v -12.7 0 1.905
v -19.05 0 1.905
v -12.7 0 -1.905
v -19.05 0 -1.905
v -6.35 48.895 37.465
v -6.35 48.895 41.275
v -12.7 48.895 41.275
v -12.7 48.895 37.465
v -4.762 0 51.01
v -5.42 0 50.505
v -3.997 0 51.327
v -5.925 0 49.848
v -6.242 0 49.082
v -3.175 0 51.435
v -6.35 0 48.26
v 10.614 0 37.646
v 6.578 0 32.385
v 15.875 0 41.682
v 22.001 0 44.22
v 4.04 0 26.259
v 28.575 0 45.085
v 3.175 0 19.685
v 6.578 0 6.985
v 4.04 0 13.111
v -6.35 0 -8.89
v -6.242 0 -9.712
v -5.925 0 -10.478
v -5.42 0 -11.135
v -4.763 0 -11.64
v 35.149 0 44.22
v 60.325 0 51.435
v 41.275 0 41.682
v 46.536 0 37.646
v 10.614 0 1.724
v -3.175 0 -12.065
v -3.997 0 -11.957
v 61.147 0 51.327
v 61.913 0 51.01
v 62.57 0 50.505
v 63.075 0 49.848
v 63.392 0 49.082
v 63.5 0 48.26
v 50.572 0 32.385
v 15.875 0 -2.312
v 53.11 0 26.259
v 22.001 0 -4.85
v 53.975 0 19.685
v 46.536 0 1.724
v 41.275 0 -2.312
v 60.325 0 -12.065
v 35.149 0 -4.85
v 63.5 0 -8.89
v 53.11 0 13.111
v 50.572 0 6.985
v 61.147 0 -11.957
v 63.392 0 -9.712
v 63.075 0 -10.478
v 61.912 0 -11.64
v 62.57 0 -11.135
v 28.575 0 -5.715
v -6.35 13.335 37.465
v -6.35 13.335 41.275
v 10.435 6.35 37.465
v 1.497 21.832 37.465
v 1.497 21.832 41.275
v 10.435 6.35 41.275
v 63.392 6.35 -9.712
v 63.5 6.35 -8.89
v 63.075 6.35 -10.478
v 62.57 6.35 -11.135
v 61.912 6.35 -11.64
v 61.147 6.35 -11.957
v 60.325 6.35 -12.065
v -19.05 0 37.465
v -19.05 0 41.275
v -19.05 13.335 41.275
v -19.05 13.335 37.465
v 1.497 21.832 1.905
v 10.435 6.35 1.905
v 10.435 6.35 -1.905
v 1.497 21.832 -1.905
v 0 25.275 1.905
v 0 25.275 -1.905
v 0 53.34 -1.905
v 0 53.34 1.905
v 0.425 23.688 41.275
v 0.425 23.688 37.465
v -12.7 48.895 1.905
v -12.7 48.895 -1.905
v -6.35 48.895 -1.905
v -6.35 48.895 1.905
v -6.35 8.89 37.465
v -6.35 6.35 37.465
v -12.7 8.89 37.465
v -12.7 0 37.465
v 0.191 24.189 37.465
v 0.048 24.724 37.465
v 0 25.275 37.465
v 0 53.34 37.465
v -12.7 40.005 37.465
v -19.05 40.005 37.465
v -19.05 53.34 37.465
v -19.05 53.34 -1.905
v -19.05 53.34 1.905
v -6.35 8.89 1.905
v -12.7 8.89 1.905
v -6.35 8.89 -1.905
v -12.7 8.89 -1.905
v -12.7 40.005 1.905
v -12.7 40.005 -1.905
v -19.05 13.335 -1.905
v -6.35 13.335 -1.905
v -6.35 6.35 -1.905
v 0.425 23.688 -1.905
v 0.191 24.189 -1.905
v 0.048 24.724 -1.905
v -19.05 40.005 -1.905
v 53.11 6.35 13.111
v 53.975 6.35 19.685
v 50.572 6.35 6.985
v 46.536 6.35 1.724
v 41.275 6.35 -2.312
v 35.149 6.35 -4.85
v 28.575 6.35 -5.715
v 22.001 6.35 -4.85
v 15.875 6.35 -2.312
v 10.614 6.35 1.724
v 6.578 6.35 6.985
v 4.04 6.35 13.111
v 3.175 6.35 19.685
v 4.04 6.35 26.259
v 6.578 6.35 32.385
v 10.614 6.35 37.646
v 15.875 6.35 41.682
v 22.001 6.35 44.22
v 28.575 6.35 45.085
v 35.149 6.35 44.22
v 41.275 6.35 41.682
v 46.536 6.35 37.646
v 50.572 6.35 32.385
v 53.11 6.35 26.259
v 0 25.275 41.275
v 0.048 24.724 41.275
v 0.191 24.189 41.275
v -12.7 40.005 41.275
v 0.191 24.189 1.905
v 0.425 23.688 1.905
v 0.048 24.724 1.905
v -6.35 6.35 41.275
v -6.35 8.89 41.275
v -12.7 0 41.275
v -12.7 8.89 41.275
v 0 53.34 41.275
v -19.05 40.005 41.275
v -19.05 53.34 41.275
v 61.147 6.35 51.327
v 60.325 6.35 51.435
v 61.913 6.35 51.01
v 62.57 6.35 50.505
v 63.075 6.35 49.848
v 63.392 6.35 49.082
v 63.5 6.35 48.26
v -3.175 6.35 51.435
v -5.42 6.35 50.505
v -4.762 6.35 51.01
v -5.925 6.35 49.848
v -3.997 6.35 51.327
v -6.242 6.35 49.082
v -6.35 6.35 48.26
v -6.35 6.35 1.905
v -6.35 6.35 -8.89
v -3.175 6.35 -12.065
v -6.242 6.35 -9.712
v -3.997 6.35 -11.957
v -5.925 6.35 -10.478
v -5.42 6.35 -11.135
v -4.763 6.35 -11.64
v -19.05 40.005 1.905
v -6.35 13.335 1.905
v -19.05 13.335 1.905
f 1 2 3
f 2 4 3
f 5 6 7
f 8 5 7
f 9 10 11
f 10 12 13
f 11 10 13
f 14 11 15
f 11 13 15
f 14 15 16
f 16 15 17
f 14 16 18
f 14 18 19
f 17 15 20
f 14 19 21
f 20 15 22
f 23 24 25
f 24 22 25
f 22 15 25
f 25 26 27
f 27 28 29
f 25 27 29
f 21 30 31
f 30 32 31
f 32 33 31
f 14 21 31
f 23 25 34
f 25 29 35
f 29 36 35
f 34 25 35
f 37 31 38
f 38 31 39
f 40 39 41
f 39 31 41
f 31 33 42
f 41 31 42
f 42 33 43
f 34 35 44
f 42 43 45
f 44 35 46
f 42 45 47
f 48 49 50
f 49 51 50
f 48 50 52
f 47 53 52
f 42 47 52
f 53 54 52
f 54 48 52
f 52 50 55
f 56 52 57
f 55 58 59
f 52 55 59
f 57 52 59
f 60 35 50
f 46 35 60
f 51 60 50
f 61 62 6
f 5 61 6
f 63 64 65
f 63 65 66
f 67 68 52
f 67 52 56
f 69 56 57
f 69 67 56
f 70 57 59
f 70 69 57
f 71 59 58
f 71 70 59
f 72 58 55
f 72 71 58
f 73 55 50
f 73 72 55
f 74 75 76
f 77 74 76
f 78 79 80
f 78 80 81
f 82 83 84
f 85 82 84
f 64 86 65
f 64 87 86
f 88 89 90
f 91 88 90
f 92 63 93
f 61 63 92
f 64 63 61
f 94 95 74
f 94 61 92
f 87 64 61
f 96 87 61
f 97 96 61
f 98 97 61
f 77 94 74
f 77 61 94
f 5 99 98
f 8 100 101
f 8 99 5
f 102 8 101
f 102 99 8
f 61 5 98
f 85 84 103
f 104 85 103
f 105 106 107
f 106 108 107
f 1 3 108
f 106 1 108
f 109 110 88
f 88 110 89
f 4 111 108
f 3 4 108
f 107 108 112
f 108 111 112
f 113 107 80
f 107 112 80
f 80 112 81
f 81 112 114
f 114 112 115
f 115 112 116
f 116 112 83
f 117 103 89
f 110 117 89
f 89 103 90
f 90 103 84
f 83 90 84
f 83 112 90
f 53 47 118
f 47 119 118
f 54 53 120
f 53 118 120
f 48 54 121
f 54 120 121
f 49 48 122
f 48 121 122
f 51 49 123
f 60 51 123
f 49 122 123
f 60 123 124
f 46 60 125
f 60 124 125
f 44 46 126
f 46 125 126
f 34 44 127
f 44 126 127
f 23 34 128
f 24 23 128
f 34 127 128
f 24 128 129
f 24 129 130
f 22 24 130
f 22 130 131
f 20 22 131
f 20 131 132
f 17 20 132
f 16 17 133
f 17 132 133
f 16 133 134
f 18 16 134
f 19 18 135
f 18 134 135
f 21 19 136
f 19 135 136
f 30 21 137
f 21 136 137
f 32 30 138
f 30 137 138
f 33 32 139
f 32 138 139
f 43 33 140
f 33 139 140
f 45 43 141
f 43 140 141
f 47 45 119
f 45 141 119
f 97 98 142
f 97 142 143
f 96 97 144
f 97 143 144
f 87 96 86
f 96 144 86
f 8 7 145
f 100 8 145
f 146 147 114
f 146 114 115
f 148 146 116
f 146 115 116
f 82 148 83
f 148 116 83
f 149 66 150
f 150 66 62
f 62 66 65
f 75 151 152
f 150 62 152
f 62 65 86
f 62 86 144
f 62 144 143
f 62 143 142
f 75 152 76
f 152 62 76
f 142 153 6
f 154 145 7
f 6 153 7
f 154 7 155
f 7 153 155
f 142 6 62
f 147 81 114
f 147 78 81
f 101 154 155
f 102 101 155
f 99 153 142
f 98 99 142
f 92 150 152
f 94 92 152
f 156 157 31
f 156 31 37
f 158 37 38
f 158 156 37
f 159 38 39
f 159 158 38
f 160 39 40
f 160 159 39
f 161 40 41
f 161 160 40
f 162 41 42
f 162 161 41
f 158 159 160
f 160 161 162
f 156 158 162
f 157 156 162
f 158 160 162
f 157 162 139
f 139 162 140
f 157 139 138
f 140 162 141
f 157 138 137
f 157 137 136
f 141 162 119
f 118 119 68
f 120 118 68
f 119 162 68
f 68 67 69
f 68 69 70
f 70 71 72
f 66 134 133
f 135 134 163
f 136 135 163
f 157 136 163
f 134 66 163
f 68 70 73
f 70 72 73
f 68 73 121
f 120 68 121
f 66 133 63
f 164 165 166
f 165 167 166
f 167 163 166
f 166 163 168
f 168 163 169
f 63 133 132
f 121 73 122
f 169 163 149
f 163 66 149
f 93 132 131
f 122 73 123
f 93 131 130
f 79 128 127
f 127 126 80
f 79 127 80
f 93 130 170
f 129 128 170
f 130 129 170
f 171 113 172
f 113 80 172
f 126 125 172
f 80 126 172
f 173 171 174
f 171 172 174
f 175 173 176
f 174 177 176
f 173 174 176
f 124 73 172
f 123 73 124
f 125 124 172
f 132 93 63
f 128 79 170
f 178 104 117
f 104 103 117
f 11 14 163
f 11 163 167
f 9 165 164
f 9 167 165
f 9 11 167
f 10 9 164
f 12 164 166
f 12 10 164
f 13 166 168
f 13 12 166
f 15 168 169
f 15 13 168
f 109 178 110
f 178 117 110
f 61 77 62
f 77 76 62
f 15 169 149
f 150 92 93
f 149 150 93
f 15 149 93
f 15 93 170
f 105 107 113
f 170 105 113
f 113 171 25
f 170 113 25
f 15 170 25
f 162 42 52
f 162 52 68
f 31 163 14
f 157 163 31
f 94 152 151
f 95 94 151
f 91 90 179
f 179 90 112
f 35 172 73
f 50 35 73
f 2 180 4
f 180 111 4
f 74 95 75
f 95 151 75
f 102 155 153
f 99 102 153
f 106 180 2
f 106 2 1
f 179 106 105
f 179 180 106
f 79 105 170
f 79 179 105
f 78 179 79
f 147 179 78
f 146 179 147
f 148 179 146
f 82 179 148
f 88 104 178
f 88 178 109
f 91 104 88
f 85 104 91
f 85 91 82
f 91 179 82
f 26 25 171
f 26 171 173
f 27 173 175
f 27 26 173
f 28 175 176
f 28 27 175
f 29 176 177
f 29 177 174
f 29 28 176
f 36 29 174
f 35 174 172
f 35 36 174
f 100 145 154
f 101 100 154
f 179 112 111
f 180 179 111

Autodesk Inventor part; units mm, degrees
ref_plane "YZ Plane" through (0, 0, 0) normal (1, 0, 0) x (0, 1, 0)
ref_plane "XZ Plane" through (0, 0, 0) normal (0, 1, 0) x (-1, 0, 0)
sketch "Sketch1" plane through (0, 0, 0) normal (0, 0, 1) x (1, 0, 0)
  line L0 (0, 6.35) -> (0, 53.34)
  line L1 (0, 53.34) -> (-19.05, 53.34)
  line L2 (-19.05, 53.34) -> (-19.05, 55.245)
  line L3 (-12.7, 48.895) -> (-6.35, 48.895)
  line L4 (-6.35, 48.895) -> (-6.35, 13.335)
  line L5 (-6.35, 13.335) -> (-19.05, 13.335)
  line L6 (-19.05, 13.335) -> (-19.05, 12.7)
  line L7 (-12.7, 8.89) -> (-6.35, 8.89)
  line L8 (-6.35, 8.89) -> (-6.35, 0)
  line L9 (-6.35, 0) -> (0, 0)
  line L10 (-19.05, 55.245) -> (-19.05, 40.005)
  line L11 (-19.05, 40.005) -> (-12.7, 40.005)
  line L12 (-12.7, 40.005) -> (-12.7, 48.895)
  line L13 (-19.05, 12.7) -> (-19.05, 0)
  line L14 (-19.05, 0) -> (-12.7, 0)
  line L15 (-12.7, 0) -> (-12.7, 8.89)
  line L16 (0, 0) -> (0, 6.35)
  line L17 (0, 0) -> (10.16, 0)
  line L18 (10.16, 0) -> (0, 23.7508)
  point P0 (-19.05, 53.34)
  point P1 (-19.05, 11.43)
  dimension "d1" = 35.56
  dimension "d2" = 4.445
  dimension "d3" = 4.445
  dimension "d4" = 6.35
  dimension "d6" = 6.35
  dimension "d7" = 6.35
  dimension "d13" = 13.335
  dimension "d14" = 13.335
  dimension "d35" = 10.16
  dimension "d36" = 66.84
extrude "Extrusion1" add sketch "Sketch1" along normal mid plane 3.81 contours L16 L9 L8 L7 L15 L14 L13 L6 L5 L4 L3 L12 L11 L10 L1 L0
ref_plane "Work Plane1" through (0, 0, 19.685) normal (0, 0, 1) x (1, 0, 0)
mirror "Mirror1" about plane through (0, 0, 19.685) normal (0, 0, 1) of "Extrusion1"
sketch "Sketch4" plane through (0, 0, 19.685) normal (0, 0, 1) x (1, 0, 0)
  line L0 (-6.35, 8.89) -> (-6.35, 0) projected
  line L1 (-6.35, 0) -> (63.5, 0)
  line L2 (63.5, 0) -> (63.5, 6.35)
  line L3 (63.5, 6.35) -> (-6.35, 6.35)
  line L4 (-6.35, 6.35) -> (-6.35, 0)
  point P0 (0, 0)
  dimension "d23" = 69.85
  dimension "d24" = 6.35
extrude "Extrusion4" add sketch "Sketch4" along normal mid plane 63.5
sketch "Sketch5" plane through (-6.35, 6.35, 51.435) normal (0, 1, 0) x (1, 0, 0)
  line L0 (0, 63.5) -> (69.85, 63.5) construction
  line L1 (69.85, 63.5) -> (69.85, 0) construction
  line L2 (0, 0) -> (69.85, 0) construction
  line L3 (0, 0) -> (0, 63.5) construction
  line L4 (0, 63.5) -> (69.85, 0) construction
  line L5 (69.85, 63.5) -> (0, 0) construction
  circle A0 centre (34.925, 31.75) radius 25.4
  point P0 (6.35, 51.435)
  dimension "d32" = 50.8
fillet "Fillet1" radius 3.175 4 edges at (-6.35, 3.175, 51.435) (63.5, 3.175, 51.435) (63.5, 3.175, -12.065) (-6.35, 3.175, -12.065)
extrude "Extrusion6" cut sketch "Sketch5" against normal through all
sketch "Sketch6" plane through (0, 0, 1.905) normal (0, 0, 1) x (1, 0, 0)
  line L0 (-3.175, 6.35) -> (60.325, 6.35) projected
  line L1 (10.4354, 6.35) -> (0, 6.35)
  line L2 (10.4354, 6.35) -> (1.4968, 21.8321)
  line L3 (10.4354, 6.35) -> (28.3126, 6.35) construction
  line L4 (1.4968, 21.8321) -> (0, 24.4246)
  line L5 (0, 53.34) -> (0, 6.35) projected
  line L6 (0, 24.4246) -> (0, 6.35)
  point P0 (0, 0)
  dimension "d37" = 120
extrude "Extrusion7" add sketch "Sketch6" against normal blind 3.81
mirror "Mirror2" about plane through (0, 0, 19.685) normal (0, 0, 1) of "Extrusion7"
fillet "Fillet2" radius 3.175 2 edges at (0, 24.4246, 39.37) (0, 24.4246, 0)
equation "\"d11\" = width"
equation "\"d15\" = oneHalfSpacing"
equation "\"width\" = 3.81"
equation "\"spacing\" = 39.37"
equation "\"oneHalfSpacing\" = 0.5 * spacing"
properties part number "round_2_0_inchHoleV01"
